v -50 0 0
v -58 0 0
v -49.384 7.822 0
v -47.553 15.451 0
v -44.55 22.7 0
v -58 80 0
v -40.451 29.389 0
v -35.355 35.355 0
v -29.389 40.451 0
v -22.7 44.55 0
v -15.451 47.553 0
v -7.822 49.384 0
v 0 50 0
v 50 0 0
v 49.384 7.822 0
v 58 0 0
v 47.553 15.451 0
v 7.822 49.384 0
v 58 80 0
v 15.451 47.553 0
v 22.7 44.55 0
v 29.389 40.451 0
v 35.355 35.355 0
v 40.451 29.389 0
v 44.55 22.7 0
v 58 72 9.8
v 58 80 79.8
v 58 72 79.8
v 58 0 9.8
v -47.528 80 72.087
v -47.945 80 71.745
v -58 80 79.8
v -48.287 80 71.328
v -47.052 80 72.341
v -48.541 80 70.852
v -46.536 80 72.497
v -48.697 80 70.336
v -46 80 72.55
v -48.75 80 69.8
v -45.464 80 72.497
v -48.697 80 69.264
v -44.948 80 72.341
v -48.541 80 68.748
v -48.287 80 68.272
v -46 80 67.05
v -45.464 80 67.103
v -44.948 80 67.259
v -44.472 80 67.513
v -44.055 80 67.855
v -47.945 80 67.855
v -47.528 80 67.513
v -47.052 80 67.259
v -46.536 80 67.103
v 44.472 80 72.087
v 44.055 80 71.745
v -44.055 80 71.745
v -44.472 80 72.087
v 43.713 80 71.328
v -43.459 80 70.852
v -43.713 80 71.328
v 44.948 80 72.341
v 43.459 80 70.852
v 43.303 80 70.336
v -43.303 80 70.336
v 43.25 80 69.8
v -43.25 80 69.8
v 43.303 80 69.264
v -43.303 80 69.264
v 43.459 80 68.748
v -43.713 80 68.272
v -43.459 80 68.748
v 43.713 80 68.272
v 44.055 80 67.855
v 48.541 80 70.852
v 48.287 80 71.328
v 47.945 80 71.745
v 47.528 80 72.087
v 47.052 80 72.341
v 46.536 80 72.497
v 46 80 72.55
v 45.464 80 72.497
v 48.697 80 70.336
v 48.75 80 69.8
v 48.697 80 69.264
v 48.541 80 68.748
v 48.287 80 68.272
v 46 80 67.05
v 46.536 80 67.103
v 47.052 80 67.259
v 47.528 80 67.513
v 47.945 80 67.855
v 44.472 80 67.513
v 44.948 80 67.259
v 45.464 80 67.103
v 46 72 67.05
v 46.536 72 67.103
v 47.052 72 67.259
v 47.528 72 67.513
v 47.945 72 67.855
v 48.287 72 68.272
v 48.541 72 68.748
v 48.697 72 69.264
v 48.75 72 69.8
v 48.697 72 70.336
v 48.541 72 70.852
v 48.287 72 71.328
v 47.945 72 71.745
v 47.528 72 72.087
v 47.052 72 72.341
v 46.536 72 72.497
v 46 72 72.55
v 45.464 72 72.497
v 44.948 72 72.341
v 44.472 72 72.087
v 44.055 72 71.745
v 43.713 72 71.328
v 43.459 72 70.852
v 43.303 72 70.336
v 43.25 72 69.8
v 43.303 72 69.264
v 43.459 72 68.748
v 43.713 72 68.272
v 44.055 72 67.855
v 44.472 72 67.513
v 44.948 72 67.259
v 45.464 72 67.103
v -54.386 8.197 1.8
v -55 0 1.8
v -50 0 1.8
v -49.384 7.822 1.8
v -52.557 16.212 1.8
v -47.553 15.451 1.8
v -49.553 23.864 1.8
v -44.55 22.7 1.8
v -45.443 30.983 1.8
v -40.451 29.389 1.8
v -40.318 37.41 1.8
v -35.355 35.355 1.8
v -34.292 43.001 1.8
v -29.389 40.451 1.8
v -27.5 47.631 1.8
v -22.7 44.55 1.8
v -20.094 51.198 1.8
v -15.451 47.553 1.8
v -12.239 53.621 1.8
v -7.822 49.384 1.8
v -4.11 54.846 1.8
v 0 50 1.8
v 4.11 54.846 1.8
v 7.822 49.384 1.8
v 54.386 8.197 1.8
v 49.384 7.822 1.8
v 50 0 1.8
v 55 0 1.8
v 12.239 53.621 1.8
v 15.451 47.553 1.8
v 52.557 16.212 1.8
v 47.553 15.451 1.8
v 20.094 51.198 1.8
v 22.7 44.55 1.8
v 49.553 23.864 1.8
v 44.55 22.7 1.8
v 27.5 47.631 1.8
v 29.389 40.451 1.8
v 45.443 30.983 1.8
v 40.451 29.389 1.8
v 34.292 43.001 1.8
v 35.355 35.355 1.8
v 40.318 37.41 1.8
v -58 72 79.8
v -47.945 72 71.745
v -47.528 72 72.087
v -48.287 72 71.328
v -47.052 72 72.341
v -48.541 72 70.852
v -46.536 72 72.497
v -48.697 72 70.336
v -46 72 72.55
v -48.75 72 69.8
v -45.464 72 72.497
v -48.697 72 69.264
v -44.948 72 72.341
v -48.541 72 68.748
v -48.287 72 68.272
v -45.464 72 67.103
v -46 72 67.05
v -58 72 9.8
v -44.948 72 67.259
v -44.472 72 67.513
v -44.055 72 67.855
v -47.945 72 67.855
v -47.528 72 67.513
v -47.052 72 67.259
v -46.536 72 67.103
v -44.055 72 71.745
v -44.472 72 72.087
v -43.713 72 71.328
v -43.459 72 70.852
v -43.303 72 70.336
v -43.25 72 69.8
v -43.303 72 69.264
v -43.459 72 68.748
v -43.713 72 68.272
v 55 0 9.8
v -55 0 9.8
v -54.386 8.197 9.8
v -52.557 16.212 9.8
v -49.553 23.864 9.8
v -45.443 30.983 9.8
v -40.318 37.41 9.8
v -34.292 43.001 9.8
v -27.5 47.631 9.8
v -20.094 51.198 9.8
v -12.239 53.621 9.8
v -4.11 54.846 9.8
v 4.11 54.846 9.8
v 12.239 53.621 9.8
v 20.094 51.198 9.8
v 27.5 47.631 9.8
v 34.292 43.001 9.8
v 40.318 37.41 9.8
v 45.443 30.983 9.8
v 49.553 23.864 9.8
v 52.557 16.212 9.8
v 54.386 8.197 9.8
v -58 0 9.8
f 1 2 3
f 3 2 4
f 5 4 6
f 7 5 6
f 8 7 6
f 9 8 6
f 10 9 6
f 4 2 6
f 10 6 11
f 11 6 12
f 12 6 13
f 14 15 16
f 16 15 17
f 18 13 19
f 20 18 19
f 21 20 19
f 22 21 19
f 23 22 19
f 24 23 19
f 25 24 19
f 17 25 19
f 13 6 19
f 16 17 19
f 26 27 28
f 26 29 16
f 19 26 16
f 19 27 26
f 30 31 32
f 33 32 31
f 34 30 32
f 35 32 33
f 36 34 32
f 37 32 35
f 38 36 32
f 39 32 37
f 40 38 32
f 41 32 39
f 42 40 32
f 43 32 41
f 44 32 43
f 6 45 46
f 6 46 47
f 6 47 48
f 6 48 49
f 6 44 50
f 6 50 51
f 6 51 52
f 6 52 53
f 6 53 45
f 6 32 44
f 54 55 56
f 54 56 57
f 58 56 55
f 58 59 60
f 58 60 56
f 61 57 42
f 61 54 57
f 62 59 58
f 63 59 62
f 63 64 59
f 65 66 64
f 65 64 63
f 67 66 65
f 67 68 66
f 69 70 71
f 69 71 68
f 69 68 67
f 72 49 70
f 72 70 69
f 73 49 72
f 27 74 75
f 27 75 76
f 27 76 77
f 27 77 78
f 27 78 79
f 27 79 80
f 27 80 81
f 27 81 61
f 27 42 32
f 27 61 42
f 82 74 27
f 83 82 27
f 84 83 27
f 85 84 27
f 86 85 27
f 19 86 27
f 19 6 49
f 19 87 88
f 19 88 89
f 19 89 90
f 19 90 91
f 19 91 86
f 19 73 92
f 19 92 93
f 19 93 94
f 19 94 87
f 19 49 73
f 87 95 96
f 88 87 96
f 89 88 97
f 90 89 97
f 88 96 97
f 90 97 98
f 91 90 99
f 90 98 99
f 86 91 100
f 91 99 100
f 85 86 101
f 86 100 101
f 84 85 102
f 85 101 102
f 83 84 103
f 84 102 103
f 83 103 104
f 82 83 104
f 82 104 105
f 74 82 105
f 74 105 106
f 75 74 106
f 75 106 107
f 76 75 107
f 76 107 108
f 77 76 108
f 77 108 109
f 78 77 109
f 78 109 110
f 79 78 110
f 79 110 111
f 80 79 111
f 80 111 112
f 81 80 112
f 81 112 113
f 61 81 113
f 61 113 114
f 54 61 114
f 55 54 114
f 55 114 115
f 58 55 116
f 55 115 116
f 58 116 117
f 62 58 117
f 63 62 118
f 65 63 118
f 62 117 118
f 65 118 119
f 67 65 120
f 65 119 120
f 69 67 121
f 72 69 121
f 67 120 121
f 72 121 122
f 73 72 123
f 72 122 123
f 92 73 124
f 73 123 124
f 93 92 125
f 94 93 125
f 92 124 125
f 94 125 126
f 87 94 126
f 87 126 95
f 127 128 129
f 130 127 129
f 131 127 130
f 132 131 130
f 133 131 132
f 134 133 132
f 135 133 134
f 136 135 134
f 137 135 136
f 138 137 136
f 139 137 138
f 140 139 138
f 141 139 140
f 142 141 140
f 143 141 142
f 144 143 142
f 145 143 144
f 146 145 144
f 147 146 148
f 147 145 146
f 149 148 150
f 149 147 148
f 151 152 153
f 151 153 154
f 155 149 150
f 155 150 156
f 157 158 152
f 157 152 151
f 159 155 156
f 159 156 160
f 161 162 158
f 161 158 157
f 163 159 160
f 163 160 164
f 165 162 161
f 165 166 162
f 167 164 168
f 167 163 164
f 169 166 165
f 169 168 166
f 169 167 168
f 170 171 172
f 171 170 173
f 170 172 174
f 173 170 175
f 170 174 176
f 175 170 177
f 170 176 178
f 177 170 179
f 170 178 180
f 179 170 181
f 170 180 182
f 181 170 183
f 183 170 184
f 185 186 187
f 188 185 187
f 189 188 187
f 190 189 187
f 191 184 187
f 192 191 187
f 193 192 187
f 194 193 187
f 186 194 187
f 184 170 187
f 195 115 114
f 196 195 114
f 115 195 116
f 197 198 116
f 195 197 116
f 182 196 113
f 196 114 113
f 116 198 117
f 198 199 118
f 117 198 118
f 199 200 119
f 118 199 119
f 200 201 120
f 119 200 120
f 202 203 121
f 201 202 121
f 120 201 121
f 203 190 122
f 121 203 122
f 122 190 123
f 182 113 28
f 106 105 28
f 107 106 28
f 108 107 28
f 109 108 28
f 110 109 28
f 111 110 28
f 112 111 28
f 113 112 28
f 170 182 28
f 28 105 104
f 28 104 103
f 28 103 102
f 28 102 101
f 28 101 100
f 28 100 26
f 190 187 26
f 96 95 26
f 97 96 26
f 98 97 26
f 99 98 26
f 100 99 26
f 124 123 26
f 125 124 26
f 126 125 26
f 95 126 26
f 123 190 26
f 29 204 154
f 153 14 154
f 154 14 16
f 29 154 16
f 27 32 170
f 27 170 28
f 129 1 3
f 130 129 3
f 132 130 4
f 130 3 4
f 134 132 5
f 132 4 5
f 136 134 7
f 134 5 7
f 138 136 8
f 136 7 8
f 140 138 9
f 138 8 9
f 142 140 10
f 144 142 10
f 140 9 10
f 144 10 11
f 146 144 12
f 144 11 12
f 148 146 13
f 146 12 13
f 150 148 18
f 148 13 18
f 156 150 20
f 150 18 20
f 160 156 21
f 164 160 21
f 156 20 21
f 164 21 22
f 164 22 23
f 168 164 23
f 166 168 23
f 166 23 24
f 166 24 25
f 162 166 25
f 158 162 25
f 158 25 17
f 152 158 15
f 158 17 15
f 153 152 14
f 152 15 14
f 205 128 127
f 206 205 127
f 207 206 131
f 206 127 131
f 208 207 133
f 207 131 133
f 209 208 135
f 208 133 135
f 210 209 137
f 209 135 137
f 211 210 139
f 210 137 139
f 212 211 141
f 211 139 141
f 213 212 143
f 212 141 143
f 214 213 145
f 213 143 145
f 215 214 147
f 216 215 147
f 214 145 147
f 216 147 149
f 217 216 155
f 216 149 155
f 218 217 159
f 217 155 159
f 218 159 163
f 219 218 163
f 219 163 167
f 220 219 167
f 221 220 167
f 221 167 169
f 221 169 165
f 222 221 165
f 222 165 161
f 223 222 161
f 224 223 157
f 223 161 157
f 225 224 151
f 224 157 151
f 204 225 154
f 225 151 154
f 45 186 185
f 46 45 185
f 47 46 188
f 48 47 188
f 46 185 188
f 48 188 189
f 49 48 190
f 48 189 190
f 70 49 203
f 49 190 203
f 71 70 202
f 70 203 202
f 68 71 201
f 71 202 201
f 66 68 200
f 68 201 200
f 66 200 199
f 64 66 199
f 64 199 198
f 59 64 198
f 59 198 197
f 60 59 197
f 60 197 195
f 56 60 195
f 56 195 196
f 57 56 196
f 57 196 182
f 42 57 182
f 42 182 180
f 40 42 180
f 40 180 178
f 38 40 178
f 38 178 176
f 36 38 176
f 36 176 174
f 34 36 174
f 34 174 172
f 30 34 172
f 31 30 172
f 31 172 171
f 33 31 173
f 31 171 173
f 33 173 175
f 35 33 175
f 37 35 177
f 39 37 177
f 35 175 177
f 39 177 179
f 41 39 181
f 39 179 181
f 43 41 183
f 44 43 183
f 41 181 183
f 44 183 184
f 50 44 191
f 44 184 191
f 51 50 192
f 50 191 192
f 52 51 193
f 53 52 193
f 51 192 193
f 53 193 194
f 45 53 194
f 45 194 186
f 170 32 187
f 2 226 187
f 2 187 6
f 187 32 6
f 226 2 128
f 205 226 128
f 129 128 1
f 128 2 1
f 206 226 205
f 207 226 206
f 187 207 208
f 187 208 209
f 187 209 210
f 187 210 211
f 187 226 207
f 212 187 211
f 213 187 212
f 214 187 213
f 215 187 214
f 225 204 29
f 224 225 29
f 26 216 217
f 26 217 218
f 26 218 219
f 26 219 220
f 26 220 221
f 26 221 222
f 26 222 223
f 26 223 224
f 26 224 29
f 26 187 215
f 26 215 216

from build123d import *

# Parameters (mm, degrees)
BOSS_EXTRUDE1_DEPTH = 1.8
BOSS_EXTRUDE4_DEPTH = 8
SKETCH5_W           = 116
SKETCH5_H           = 70
BOSS_EXTRUDE5_DEPTH = 8
SKETCH6_R           = 2.75
CUT_EXTRUDE1_DEPTH  = 123.131240885


with BuildPart() as part:
    # Sketch1 → Boss-Extrude1 (new body)
    with BuildSketch(Plane.XY):
        with BuildLine():
            Line((50, 0), (58, 0))
            Line((58, 0), (58, 80))
            Line((58, 80), (-58, 80))
            Line((-58, 80), (-58, 0))
            Line((-58, 0), (-50, 0))
            ThreePointArc((-50, 0), (0, 50), (50, 0))
        make_face()
    extrude(amount=BOSS_EXTRUDE1_DEPTH)

    # Sketch4 → Boss-Extrude4 (add)
    with BuildSketch(Plane.XY.offset(1.8)):
        with BuildLine():
            Line((-58, 0), (-55, 0))
            ThreePointArc((-55, 0), (0, 55), (55, 0))
            Line((55, 0), (58, 0))
            Line((58, 0), (58, 80))
            Line((58, 80), (-58, 80))
            Line((-58, 80), (-58, 0))
        make_face()
    extrude(amount=BOSS_EXTRUDE4_DEPTH)

    # Sketch5 → Boss-Extrude5 (add)
    with BuildSketch(Plane(origin=(0, 80, 0), x_dir=(1, 0, 0), z_dir=(0, 1, 0))):
        with Locations((0, -44.8)):
            Rectangle(SKETCH5_W, SKETCH5_H)
    extrude(amount=-BOSS_EXTRUDE5_DEPTH)

    # Sketch6 → Cut-Extrude1 (cut, through all)
    with BuildSketch(Plane.XZ.offset(-72)):
        with Locations(Location((-46, 69.8, 0), (0, 0, 270))):
            Circle(SKETCH6_R)
        with Locations(Location((46, 69.8, 0), (0, 0, 270))):
            Circle(SKETCH6_R)
    extrude(amount=-CUT_EXTRUDE1_DEPTH, mode=Mode.SUBTRACT)


solid = part.part
